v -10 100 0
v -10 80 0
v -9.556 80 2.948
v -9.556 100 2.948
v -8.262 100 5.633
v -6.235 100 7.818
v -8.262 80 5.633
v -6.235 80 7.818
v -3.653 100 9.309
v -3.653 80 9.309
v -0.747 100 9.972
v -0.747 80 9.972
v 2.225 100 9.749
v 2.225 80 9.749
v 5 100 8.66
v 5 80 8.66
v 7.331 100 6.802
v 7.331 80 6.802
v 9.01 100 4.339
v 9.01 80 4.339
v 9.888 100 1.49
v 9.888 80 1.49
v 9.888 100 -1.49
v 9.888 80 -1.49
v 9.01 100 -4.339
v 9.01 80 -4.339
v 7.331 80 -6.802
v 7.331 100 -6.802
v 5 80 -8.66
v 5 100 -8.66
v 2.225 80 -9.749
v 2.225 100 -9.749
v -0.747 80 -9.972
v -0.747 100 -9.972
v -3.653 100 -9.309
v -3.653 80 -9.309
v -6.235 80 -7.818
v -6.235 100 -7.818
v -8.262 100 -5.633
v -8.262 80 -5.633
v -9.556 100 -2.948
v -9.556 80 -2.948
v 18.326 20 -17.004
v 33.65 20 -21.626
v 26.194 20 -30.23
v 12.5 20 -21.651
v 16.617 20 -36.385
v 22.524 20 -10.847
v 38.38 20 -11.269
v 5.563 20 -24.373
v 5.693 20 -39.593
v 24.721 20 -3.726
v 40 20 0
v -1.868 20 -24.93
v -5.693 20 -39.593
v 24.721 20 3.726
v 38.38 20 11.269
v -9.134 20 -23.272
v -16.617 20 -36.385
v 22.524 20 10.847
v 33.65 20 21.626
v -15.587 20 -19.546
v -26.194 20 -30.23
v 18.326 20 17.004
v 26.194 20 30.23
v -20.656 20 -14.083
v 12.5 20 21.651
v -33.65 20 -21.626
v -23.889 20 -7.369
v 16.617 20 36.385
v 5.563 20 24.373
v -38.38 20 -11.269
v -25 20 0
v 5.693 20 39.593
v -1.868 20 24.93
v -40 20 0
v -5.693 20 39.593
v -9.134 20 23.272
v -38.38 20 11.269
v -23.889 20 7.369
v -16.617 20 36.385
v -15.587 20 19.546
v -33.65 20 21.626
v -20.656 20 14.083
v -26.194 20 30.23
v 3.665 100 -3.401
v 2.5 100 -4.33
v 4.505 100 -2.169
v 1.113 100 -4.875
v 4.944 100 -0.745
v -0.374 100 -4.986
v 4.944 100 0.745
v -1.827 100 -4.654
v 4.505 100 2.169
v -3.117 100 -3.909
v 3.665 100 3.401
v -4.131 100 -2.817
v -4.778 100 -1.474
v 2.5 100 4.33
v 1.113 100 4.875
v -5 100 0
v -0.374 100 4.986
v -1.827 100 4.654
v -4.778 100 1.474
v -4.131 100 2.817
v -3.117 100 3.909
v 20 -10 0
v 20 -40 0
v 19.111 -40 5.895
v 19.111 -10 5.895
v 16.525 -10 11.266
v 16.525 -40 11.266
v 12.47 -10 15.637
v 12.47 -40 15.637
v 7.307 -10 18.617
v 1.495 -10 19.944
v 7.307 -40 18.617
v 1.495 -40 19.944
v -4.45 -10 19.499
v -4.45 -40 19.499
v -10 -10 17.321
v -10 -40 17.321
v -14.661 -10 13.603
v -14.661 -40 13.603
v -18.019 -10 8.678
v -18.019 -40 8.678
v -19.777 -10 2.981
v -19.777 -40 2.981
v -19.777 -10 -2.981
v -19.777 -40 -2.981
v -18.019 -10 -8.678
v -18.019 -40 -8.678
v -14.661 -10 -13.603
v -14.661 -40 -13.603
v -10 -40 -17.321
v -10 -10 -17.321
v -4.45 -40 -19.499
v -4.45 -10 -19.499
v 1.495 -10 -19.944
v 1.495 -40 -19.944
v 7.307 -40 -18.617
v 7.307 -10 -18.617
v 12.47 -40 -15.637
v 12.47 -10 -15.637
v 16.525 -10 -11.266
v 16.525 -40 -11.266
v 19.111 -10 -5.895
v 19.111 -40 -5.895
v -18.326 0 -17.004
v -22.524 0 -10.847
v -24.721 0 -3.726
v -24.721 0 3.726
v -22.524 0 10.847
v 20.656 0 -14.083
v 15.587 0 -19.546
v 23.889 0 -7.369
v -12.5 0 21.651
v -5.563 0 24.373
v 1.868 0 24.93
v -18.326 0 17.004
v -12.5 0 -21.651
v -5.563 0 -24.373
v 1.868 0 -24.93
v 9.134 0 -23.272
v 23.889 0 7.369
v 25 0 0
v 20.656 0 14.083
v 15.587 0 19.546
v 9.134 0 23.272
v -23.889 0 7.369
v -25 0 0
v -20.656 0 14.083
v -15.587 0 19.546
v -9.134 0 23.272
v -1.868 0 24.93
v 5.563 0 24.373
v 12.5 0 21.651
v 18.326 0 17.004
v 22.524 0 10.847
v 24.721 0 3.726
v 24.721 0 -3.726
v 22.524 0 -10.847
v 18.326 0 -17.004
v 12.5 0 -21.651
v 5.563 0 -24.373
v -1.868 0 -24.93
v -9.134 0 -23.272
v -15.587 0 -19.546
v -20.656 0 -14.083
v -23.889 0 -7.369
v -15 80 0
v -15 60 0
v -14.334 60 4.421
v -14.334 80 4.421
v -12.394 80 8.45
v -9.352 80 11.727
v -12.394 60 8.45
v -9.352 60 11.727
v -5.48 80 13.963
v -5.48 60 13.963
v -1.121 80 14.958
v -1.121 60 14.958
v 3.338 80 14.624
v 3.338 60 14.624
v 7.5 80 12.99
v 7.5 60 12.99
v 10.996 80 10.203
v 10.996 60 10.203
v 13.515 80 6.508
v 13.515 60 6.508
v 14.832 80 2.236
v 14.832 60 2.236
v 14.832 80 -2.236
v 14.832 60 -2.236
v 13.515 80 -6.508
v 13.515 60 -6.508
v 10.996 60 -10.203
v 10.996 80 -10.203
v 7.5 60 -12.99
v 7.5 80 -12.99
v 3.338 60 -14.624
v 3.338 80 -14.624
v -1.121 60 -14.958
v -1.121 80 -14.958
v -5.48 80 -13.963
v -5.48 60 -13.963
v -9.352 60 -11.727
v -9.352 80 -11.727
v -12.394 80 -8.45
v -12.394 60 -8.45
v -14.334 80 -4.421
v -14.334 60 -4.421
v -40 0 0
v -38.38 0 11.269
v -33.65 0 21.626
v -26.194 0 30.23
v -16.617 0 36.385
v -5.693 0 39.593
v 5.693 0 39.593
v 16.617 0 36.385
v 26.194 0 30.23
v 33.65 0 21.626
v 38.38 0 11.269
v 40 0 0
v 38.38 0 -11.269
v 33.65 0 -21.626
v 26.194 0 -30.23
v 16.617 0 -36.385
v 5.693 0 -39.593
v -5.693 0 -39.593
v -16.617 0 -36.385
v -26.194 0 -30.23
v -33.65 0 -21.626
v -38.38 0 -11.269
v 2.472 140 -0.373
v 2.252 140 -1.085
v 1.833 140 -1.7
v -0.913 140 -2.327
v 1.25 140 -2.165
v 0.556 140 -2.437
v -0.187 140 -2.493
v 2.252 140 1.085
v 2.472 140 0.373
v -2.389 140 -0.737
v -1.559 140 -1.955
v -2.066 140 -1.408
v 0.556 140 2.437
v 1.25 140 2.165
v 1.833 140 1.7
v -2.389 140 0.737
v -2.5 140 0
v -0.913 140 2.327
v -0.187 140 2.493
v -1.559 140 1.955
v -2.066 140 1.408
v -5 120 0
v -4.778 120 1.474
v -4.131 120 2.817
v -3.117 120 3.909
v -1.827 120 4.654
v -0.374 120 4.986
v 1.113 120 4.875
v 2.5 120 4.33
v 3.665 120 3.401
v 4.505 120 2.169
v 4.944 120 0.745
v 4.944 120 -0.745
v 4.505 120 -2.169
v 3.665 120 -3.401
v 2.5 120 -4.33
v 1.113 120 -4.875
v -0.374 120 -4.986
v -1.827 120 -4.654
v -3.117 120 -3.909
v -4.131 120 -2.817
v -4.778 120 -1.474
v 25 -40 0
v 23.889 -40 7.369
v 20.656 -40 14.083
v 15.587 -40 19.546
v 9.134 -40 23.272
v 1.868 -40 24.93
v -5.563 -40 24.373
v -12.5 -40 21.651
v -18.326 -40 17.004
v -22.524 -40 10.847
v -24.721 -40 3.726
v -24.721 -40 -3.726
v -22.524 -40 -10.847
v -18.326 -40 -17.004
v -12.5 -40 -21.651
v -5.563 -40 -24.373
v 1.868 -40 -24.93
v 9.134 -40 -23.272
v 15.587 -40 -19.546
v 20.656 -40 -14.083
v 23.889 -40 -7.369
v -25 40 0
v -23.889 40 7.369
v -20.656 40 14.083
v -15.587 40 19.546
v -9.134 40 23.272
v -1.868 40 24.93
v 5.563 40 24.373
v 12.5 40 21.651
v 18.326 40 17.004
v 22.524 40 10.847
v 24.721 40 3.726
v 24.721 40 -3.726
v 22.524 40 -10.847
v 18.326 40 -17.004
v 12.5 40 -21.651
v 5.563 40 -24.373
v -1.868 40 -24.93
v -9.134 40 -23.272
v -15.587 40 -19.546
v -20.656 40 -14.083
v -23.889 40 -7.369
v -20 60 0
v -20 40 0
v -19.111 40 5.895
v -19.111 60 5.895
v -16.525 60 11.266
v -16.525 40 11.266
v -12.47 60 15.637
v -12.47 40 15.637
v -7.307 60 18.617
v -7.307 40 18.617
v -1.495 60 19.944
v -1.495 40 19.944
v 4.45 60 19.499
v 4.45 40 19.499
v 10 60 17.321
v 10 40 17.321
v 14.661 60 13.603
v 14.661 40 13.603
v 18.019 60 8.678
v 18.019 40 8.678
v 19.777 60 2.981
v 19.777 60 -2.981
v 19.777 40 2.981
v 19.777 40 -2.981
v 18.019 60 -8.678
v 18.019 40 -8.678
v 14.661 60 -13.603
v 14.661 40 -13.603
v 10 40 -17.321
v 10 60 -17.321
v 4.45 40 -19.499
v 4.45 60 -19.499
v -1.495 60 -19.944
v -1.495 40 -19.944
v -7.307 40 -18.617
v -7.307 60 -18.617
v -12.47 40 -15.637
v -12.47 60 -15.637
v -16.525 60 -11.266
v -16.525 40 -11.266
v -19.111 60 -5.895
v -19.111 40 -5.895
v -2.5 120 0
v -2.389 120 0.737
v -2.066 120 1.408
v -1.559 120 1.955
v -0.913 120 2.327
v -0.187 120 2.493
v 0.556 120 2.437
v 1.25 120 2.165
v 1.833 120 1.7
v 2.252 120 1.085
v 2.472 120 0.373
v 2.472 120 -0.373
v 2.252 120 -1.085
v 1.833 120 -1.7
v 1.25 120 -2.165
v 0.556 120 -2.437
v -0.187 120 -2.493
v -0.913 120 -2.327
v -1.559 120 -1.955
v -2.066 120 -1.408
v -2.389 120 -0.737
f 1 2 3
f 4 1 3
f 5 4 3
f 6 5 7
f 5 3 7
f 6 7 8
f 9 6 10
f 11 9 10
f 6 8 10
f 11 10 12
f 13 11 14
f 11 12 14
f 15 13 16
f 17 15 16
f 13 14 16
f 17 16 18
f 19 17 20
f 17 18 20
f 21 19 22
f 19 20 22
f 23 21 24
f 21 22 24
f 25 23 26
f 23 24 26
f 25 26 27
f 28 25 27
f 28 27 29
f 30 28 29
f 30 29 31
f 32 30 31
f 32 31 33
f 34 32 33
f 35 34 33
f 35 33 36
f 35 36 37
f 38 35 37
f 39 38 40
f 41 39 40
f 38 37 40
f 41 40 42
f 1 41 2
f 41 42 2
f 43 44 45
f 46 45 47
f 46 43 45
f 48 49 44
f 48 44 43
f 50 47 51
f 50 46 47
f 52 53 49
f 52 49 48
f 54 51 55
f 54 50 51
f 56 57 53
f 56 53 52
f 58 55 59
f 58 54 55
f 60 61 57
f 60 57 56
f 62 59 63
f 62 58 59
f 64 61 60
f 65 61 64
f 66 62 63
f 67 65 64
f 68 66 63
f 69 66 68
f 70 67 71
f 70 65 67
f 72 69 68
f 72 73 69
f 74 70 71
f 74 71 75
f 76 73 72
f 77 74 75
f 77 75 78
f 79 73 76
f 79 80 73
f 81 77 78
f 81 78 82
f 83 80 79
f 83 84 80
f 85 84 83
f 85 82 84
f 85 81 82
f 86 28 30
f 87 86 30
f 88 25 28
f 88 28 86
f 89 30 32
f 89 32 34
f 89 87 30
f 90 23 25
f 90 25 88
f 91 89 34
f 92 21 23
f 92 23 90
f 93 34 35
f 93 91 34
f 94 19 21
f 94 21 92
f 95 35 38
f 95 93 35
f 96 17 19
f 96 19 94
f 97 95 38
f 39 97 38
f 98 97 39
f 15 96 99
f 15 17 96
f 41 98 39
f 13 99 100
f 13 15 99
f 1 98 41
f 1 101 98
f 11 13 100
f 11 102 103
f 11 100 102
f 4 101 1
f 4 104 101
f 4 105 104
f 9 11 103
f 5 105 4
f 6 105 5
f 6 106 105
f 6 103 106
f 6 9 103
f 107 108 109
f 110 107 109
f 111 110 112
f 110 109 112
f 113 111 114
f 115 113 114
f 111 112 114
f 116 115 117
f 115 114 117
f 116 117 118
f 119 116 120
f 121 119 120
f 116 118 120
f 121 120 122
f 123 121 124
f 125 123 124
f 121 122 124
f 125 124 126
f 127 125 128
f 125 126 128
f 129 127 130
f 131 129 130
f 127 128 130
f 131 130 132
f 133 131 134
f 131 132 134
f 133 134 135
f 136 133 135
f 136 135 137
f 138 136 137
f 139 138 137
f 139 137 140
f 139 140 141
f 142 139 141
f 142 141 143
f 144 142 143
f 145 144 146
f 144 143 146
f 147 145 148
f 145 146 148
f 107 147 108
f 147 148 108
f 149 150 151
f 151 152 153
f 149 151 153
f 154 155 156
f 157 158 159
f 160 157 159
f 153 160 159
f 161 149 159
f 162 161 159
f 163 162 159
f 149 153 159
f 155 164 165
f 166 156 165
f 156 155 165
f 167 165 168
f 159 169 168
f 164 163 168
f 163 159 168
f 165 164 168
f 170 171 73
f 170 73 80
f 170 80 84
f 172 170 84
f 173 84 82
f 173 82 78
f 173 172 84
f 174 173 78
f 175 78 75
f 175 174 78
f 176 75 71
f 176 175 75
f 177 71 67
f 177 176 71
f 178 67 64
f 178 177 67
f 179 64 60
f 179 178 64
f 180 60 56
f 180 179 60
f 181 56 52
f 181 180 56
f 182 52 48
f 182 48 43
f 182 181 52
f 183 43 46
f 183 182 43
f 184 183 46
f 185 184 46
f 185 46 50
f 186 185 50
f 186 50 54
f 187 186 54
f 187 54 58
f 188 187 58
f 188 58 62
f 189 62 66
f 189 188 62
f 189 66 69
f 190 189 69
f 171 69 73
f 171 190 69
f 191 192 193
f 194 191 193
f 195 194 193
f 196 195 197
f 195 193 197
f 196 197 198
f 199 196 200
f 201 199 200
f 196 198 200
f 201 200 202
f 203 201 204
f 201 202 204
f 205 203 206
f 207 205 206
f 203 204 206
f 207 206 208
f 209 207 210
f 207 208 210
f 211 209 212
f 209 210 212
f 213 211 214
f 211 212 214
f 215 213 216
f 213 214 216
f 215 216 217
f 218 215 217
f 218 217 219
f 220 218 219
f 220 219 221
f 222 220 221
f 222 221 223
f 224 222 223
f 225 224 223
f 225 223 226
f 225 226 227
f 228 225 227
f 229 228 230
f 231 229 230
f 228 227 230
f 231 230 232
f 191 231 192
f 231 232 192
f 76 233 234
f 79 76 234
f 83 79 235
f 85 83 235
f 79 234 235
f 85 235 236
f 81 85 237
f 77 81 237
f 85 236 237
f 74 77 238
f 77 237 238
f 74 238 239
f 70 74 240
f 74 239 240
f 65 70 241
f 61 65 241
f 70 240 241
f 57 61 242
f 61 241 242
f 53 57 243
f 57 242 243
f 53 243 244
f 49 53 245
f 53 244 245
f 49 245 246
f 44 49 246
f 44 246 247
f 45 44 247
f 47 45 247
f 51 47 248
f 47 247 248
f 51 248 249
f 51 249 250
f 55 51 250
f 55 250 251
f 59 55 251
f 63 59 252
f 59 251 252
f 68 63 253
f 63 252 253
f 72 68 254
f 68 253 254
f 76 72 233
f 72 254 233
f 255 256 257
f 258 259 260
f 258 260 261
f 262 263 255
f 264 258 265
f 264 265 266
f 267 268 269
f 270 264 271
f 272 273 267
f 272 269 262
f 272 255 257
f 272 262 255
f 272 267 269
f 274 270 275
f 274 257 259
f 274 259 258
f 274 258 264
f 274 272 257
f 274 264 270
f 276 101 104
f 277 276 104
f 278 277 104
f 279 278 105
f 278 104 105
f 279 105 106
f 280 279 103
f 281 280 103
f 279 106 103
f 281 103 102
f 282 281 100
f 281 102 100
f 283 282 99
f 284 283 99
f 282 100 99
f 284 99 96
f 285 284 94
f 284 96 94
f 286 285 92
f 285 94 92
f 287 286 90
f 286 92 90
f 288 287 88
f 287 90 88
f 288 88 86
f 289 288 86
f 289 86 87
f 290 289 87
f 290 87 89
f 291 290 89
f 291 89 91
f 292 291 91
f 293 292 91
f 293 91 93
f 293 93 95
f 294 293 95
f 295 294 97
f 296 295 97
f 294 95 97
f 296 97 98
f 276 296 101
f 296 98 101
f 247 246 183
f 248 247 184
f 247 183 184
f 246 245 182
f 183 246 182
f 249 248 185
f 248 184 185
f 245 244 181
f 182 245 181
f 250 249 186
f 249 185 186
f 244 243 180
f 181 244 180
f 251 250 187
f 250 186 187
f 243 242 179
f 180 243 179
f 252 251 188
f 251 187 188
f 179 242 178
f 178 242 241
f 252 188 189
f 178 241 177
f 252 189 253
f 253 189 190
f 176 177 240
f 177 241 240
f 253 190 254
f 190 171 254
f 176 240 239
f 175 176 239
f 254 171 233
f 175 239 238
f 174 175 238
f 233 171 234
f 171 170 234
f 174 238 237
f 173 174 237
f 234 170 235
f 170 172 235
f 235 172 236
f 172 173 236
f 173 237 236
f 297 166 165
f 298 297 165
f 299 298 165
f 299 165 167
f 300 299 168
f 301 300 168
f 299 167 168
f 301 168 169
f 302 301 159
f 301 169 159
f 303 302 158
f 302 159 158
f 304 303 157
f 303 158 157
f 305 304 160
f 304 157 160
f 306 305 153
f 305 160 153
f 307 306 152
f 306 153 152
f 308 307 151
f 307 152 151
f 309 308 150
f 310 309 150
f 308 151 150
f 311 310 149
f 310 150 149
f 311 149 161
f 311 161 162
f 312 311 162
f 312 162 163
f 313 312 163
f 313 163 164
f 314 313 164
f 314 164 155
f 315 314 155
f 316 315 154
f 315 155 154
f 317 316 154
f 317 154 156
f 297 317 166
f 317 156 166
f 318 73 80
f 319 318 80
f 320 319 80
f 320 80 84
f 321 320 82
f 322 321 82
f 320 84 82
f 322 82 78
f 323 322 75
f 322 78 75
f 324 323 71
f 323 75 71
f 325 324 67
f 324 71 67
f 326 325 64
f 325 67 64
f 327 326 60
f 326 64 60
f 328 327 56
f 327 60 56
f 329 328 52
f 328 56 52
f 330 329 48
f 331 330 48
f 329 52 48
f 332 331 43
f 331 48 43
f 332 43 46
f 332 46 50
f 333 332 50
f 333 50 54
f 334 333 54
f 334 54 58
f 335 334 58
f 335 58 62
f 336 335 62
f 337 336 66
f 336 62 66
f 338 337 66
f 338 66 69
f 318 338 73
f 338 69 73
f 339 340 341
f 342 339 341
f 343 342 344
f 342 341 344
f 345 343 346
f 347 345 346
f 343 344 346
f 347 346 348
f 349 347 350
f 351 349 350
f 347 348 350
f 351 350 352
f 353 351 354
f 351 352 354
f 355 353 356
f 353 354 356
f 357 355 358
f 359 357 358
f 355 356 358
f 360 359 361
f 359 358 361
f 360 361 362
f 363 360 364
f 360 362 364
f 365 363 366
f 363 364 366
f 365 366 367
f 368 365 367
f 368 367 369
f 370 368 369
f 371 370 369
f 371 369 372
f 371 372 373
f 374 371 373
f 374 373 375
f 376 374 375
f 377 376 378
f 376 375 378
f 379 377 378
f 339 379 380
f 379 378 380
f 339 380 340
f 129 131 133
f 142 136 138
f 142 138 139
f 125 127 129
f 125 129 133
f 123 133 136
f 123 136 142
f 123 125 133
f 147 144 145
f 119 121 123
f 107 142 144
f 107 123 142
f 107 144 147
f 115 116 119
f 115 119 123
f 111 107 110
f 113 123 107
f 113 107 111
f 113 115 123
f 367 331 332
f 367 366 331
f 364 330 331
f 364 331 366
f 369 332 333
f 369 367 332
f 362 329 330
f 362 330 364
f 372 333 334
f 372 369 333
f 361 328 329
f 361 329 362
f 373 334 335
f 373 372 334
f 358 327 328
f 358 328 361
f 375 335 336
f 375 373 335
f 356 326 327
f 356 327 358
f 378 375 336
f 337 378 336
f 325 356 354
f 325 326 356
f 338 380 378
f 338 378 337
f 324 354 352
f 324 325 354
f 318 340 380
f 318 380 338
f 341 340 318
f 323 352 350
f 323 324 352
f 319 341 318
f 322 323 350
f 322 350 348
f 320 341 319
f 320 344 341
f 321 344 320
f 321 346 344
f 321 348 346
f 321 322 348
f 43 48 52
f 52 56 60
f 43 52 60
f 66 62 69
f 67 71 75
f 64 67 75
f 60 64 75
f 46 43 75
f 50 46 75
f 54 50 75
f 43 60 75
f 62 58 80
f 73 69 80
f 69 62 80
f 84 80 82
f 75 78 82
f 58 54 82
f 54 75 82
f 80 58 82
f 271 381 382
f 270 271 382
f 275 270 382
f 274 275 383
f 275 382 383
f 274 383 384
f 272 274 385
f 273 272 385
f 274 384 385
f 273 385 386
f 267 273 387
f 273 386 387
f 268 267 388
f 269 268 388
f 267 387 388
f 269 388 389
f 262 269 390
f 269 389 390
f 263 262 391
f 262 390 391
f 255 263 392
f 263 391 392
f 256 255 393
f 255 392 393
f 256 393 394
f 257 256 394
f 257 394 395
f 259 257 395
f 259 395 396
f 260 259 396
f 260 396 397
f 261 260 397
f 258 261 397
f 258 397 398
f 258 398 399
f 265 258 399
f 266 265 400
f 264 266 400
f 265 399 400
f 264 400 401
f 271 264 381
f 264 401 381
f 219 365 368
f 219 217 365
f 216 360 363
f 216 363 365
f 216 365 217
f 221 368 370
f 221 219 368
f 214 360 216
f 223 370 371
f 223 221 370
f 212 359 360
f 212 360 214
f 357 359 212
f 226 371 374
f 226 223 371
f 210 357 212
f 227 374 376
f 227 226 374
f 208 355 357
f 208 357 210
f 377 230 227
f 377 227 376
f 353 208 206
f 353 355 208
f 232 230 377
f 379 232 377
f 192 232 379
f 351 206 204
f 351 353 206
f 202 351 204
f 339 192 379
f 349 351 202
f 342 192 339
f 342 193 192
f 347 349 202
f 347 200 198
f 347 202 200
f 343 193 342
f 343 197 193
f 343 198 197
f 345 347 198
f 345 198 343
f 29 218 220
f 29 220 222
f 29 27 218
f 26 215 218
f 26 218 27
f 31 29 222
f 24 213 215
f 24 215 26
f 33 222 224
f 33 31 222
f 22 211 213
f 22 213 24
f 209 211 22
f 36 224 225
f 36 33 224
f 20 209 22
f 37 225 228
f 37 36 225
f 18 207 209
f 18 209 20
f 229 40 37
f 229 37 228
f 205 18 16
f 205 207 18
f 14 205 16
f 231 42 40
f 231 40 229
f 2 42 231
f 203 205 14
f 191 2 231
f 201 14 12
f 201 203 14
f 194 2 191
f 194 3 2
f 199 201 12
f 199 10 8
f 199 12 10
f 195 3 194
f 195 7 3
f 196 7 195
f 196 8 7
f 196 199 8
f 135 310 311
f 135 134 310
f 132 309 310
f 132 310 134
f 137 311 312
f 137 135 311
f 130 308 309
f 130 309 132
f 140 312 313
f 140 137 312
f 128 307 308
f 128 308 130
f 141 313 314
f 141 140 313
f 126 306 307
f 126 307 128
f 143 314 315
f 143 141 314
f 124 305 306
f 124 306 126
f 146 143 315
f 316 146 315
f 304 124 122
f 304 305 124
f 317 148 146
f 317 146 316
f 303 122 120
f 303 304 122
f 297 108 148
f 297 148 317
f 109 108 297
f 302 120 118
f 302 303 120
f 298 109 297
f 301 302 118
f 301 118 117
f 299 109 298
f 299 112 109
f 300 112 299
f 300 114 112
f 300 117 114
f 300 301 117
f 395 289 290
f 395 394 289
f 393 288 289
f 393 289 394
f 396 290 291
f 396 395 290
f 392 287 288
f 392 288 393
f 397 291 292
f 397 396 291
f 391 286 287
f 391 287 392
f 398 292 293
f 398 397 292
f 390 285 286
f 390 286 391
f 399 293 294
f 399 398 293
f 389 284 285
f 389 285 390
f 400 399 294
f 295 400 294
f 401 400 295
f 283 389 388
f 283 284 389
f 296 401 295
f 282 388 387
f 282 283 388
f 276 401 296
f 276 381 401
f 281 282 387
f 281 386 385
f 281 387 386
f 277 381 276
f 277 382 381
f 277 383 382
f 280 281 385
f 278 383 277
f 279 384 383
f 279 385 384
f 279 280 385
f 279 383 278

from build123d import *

# Parameters (mm, degrees)
F0_R      = 25
F1_DEPTH  = 40
F2_R      = 20
F3_DEPTH  = 30
F4_R      = 40
F4_R_2    = 25
F5_DEPTH  = 20
F6_R      = 25
F7_DEPTH  = 20
F8_R      = 20
F9_DEPTH  = 20
F10_R     = 15
F11_DEPTH = 20
F12_R     = 10
F13_DEPTH = 20
F14_R     = 5
F15_DEPTH = 20
F16_R     = 2.5
F17_DEPTH = 20


with BuildPart() as f1:
    # F0 (on Front) → F1 (new body)
    with BuildSketch(Plane.XZ):
        Circle(F0_R)
    extrude(amount=F1_DEPTH)

    # F2 (on face) → F3 (cut)
    with BuildSketch(Plane.XZ.offset(40)):
        Circle(F2_R)
    extrude(amount=-F3_DEPTH, mode=Mode.SUBTRACT)


with BuildPart() as f5:
    # F4 (on face) → F5 (new body)
    with BuildSketch(Plane(origin=(0, 0, 0), x_dir=(-1, 0, 0), z_dir=(0, 1, 0))):
        Circle(F4_R)
        Circle(F4_R_2, mode=Mode.SUBTRACT)
    extrude(amount=F5_DEPTH)


with BuildPart() as f7:
    # F6 (on face) → F7 (new body)
    with BuildSketch(Plane(origin=(0, 20, 0), x_dir=(-1, 0, 0), z_dir=(0, 1, 0))):
        Circle(F6_R)
    extrude(amount=F7_DEPTH)

    # F8 (on face) → F9 (join)
    with BuildSketch(Plane(origin=(0, 40, 0), x_dir=(-1, 0, 0), z_dir=(0, 1, 0))):
        Circle(F8_R)
    extrude(amount=F9_DEPTH)

    # F10 (on face) → F11 (join)
    with BuildSketch(Plane(origin=(0, 60, 0), x_dir=(-1, 0, 0), z_dir=(0, 1, 0))):
        Circle(F10_R)
    extrude(amount=F11_DEPTH)

    # F12 (on face) → F13 (join)
    with BuildSketch(Plane(origin=(0, 80, 0), x_dir=(-1, 0, 0), z_dir=(0, 1, 0))):
        Circle(F12_R)
    extrude(amount=F13_DEPTH)

    # F14 (on face) → F15 (join)
    with BuildSketch(Plane(origin=(0, 100, 0), x_dir=(-1, 0, 0), z_dir=(0, 1, 0))):
        Circle(F14_R)
    extrude(amount=F15_DEPTH)

    # F16 (on face) → F17 (join)
    with BuildSketch(Plane(origin=(0, 120, 0), x_dir=(-1, 0, 0), z_dir=(0, 1, 0))):
        Circle(F16_R)
    extrude(amount=F17_DEPTH)


solid = Compound([f1.part, f5.part, f7.part])
